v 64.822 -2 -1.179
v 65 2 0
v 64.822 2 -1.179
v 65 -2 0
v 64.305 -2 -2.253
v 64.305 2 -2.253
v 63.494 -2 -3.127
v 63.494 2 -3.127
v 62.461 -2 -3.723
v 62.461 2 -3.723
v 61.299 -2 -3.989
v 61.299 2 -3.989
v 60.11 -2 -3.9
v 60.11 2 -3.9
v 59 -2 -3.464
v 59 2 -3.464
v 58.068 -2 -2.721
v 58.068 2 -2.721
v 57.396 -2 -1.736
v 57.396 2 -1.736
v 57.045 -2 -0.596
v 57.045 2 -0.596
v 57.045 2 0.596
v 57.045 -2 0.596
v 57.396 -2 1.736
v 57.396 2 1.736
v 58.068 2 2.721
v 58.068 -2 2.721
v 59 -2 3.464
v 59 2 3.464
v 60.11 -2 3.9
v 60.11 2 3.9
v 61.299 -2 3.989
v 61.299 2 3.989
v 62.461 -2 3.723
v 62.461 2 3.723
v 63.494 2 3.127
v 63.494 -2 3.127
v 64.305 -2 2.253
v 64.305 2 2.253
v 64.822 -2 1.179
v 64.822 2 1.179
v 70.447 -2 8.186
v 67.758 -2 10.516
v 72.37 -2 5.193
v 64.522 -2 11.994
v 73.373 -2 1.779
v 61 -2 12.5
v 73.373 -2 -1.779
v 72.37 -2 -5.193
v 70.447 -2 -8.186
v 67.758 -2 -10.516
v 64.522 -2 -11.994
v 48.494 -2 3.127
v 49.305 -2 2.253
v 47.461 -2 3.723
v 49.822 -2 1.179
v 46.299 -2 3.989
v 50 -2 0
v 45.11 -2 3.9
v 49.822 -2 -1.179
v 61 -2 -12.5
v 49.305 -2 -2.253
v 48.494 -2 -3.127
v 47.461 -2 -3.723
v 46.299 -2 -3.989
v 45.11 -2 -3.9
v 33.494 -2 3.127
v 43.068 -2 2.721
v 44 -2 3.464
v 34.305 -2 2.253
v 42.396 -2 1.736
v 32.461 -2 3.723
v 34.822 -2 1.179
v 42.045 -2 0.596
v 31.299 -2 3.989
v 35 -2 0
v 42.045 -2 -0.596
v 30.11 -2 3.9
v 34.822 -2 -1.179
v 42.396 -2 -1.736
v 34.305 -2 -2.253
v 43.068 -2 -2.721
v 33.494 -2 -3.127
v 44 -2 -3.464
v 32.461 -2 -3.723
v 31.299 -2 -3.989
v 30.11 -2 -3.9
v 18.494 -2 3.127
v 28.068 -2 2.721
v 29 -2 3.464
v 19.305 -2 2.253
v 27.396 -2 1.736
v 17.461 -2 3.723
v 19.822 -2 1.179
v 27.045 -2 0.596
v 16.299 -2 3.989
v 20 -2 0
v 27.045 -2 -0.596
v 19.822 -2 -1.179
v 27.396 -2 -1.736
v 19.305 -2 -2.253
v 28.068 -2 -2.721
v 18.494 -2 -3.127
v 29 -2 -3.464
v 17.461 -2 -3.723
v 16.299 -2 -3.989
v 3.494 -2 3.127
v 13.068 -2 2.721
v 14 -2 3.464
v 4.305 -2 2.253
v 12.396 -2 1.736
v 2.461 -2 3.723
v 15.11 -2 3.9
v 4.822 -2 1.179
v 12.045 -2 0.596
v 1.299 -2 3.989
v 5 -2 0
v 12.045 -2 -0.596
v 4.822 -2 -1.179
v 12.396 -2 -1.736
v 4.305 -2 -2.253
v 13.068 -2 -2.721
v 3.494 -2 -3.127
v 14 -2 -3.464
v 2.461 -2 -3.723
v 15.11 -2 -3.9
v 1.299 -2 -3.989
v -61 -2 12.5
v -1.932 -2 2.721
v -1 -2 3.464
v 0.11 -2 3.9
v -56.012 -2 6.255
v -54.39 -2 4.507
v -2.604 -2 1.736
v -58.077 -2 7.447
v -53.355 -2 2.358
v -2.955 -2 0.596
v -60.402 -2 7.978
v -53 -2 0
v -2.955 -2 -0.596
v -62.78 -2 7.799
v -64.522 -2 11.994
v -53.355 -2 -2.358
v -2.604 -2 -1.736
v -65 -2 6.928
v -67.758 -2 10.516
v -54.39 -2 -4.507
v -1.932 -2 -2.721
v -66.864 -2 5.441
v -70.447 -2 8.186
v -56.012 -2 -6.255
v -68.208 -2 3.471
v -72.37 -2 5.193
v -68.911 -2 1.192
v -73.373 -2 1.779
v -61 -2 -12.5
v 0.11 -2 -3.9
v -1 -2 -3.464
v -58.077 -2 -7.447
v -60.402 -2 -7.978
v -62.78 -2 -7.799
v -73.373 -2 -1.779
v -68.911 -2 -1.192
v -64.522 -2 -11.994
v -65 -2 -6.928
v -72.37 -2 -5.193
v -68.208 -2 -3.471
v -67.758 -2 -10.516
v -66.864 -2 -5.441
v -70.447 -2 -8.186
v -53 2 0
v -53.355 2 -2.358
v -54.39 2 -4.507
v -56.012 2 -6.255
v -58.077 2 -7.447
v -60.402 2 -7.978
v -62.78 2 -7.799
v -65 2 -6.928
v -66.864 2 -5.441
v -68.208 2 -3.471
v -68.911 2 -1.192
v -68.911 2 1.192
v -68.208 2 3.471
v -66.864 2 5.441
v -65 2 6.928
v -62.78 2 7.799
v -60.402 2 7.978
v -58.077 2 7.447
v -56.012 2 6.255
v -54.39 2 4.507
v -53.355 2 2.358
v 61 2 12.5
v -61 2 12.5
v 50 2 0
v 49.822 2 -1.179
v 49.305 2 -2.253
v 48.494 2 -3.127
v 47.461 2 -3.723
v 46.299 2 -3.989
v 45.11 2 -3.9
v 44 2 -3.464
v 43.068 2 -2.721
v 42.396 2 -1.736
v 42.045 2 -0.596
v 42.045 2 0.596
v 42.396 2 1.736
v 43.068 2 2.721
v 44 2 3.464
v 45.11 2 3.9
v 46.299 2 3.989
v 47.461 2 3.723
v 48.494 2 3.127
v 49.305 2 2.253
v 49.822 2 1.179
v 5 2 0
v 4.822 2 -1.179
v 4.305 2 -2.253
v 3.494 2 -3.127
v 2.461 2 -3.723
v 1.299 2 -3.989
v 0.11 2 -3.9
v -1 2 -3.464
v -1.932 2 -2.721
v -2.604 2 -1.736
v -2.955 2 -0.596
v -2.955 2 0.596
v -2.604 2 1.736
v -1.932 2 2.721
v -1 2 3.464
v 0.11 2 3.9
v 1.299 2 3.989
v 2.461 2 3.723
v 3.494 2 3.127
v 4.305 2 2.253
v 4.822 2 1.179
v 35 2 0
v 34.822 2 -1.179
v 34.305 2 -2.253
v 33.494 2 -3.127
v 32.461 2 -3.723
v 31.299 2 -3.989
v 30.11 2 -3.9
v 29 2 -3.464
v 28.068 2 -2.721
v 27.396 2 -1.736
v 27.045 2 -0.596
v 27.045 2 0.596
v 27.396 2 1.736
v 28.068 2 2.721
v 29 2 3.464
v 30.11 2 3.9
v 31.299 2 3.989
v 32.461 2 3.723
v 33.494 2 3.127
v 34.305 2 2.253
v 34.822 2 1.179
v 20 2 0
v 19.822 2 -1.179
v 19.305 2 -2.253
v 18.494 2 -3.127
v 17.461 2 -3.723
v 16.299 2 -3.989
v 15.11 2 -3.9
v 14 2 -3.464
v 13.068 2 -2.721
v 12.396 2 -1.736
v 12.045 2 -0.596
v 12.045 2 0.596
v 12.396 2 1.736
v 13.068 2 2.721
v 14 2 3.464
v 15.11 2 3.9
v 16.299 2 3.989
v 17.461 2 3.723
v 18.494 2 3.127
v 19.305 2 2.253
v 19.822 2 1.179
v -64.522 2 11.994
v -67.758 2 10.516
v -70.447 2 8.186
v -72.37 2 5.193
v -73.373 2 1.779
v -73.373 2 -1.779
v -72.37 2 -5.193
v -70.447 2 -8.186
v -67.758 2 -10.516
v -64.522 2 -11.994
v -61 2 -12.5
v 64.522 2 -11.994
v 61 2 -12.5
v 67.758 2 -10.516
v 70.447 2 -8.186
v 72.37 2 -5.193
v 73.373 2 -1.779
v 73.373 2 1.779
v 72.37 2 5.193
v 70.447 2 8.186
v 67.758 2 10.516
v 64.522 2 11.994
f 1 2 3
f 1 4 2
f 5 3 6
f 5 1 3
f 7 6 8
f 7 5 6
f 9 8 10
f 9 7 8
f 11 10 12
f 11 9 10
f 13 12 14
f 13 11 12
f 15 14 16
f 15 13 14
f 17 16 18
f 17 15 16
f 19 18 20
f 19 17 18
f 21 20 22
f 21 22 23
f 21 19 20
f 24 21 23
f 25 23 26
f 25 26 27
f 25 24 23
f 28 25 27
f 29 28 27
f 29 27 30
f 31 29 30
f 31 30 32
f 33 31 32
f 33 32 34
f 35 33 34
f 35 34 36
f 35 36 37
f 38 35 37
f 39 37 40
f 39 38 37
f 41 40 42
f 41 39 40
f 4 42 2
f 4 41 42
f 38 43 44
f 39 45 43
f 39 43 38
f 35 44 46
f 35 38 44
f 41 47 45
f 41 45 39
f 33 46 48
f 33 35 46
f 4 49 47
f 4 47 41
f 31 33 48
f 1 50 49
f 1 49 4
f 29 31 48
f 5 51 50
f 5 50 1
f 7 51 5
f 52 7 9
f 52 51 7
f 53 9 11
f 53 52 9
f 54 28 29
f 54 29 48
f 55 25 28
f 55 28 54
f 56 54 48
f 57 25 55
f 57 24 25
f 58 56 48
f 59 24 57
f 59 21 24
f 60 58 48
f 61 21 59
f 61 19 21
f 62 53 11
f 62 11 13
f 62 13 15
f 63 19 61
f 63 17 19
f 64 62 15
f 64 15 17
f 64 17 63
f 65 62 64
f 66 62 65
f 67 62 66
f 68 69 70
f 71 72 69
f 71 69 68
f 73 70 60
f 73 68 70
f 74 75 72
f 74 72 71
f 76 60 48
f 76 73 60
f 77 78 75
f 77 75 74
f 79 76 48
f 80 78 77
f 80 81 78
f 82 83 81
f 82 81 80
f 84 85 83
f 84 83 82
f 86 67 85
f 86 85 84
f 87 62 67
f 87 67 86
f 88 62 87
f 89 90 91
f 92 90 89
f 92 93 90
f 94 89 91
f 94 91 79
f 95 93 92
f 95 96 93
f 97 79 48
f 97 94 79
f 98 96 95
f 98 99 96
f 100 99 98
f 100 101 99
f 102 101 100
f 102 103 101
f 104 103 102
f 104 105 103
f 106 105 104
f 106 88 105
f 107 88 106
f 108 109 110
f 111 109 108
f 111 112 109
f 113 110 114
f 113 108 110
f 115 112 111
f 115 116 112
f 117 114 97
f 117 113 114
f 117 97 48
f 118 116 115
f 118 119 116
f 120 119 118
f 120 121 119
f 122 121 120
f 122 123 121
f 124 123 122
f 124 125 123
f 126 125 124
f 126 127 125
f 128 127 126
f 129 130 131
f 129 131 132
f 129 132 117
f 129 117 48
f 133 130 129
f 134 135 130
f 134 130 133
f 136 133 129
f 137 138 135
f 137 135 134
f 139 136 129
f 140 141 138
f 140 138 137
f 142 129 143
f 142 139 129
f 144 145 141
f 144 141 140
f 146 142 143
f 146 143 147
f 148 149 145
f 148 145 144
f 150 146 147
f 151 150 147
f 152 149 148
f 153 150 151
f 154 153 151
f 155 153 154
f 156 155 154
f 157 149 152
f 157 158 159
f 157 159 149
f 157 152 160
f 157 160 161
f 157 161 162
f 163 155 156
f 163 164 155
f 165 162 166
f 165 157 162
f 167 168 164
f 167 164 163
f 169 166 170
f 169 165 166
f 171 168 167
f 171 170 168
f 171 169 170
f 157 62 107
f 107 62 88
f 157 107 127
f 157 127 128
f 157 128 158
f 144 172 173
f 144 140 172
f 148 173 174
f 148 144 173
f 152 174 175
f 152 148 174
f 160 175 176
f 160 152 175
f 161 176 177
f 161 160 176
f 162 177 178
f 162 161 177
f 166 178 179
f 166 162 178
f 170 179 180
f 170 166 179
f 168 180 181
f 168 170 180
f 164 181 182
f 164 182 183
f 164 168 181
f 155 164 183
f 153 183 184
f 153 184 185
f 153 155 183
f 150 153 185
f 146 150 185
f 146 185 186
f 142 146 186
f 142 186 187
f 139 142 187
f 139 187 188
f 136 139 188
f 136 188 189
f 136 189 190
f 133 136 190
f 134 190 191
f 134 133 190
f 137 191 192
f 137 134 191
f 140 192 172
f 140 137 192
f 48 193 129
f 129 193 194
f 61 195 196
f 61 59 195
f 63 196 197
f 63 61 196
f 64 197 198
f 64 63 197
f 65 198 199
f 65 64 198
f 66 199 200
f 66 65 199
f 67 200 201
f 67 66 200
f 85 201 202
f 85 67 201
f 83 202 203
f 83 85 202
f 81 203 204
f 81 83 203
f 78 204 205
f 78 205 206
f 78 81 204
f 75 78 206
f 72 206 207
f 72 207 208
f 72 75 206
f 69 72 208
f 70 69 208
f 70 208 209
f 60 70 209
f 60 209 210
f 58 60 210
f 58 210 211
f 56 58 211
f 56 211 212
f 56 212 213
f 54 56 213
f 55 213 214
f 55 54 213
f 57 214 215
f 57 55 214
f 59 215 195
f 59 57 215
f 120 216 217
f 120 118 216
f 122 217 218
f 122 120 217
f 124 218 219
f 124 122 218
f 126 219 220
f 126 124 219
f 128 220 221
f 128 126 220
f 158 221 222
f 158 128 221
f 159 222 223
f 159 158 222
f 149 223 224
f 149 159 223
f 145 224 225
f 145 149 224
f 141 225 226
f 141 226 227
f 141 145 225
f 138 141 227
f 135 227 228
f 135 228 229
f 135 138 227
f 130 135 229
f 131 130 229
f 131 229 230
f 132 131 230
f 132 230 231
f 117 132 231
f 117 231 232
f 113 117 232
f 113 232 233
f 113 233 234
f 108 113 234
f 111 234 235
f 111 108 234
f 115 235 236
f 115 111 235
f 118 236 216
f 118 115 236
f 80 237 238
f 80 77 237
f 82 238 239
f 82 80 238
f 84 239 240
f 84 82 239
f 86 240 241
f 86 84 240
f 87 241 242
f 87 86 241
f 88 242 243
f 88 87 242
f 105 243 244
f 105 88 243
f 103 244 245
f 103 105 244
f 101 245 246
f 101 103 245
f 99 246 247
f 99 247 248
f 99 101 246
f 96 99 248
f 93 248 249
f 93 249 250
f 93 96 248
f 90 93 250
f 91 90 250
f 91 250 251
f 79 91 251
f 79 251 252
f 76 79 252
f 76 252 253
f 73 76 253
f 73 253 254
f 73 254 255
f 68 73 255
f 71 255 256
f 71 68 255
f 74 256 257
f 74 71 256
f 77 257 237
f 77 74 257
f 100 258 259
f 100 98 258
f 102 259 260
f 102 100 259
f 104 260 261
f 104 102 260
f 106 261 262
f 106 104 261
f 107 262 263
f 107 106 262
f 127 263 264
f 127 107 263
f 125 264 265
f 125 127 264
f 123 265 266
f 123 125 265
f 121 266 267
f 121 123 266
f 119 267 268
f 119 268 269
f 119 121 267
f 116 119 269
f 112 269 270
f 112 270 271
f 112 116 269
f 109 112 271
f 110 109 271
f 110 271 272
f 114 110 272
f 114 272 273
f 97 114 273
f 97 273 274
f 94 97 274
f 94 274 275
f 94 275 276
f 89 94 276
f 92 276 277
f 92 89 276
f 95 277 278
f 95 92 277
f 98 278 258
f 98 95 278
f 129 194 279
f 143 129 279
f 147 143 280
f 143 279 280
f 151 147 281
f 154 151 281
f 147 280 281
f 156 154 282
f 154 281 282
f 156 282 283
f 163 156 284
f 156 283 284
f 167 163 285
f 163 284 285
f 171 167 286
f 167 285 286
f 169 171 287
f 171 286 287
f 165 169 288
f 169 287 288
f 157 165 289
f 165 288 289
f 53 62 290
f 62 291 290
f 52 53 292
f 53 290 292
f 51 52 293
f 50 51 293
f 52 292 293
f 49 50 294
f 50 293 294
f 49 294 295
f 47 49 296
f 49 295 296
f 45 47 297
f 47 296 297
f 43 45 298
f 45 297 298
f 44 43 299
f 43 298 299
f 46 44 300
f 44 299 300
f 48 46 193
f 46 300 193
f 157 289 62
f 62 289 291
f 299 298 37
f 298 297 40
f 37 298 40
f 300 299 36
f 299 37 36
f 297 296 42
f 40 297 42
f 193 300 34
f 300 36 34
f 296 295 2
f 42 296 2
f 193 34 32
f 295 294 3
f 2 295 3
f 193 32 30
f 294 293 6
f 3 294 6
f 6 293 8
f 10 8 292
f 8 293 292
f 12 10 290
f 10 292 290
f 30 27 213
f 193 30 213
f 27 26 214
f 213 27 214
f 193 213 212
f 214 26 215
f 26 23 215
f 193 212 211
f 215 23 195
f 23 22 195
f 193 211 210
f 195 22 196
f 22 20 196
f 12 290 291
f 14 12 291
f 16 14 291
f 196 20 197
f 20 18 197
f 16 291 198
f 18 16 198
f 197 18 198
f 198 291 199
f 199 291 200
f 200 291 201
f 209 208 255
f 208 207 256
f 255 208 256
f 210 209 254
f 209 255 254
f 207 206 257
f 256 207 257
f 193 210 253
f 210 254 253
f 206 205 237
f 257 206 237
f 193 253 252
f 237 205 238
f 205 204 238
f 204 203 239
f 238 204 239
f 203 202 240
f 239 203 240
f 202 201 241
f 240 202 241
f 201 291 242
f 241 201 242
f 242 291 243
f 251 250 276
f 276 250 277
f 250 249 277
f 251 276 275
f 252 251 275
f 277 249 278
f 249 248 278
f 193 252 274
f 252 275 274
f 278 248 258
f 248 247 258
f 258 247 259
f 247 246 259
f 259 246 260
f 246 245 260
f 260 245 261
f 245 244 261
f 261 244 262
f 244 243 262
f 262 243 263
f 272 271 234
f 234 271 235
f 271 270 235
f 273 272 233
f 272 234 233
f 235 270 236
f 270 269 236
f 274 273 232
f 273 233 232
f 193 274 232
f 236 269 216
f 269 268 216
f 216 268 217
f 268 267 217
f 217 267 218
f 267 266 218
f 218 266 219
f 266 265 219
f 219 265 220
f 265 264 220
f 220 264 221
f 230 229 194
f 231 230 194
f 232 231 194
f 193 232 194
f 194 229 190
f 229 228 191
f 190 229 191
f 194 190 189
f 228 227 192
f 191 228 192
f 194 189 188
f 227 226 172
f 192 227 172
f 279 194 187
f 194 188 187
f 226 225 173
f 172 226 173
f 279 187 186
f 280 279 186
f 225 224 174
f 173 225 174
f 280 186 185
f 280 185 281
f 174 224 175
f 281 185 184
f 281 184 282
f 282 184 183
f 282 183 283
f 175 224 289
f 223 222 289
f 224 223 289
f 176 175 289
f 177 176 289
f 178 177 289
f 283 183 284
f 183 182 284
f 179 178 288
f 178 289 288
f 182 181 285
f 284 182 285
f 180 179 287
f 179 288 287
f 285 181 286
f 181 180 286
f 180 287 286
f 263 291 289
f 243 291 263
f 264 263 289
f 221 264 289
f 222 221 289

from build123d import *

# Parameters (mm, degrees)
SKETCH1_R           = 8
SKETCH1_R_2         = 4
BOSS_EXTRUDE1_DEPTH = 2


with BuildPart() as part:
    # Sketch1 → Boss-Extrude1 (new body, symmetric)
    with BuildSketch(Plane(origin=(0, 0, 0), x_dir=(1, 0, 0), z_dir=(0, 1, 0))):
        with BuildLine():
            Line((-61, 12.5), (61, 12.5))
            ThreePointArc((61, 12.5), (73.5, 0), (61, -12.5))
            Line((61, -12.5), (-61, -12.5))
            ThreePointArc((-61, -12.5), (-73.5, 0), (-61, 12.5))
        make_face()
        with Locations((-61, 0)):
            Circle(SKETCH1_R, mode=Mode.SUBTRACT)
        with Locations((1, 0)):
            Circle(SKETCH1_R_2, mode=Mode.SUBTRACT)
        with Locations((16, 0)):
            Circle(SKETCH1_R_2, mode=Mode.SUBTRACT)
        with Locations((31, 0)):
            Circle(SKETCH1_R_2, mode=Mode.SUBTRACT)
        with Locations((46, 0)):
            Circle(SKETCH1_R_2, mode=Mode.SUBTRACT)
        with Locations((61, 0)):
            Circle(SKETCH1_R_2, mode=Mode.SUBTRACT)
    extrude(amount=BOSS_EXTRUDE1_DEPTH, both=True)


solid = part.part
